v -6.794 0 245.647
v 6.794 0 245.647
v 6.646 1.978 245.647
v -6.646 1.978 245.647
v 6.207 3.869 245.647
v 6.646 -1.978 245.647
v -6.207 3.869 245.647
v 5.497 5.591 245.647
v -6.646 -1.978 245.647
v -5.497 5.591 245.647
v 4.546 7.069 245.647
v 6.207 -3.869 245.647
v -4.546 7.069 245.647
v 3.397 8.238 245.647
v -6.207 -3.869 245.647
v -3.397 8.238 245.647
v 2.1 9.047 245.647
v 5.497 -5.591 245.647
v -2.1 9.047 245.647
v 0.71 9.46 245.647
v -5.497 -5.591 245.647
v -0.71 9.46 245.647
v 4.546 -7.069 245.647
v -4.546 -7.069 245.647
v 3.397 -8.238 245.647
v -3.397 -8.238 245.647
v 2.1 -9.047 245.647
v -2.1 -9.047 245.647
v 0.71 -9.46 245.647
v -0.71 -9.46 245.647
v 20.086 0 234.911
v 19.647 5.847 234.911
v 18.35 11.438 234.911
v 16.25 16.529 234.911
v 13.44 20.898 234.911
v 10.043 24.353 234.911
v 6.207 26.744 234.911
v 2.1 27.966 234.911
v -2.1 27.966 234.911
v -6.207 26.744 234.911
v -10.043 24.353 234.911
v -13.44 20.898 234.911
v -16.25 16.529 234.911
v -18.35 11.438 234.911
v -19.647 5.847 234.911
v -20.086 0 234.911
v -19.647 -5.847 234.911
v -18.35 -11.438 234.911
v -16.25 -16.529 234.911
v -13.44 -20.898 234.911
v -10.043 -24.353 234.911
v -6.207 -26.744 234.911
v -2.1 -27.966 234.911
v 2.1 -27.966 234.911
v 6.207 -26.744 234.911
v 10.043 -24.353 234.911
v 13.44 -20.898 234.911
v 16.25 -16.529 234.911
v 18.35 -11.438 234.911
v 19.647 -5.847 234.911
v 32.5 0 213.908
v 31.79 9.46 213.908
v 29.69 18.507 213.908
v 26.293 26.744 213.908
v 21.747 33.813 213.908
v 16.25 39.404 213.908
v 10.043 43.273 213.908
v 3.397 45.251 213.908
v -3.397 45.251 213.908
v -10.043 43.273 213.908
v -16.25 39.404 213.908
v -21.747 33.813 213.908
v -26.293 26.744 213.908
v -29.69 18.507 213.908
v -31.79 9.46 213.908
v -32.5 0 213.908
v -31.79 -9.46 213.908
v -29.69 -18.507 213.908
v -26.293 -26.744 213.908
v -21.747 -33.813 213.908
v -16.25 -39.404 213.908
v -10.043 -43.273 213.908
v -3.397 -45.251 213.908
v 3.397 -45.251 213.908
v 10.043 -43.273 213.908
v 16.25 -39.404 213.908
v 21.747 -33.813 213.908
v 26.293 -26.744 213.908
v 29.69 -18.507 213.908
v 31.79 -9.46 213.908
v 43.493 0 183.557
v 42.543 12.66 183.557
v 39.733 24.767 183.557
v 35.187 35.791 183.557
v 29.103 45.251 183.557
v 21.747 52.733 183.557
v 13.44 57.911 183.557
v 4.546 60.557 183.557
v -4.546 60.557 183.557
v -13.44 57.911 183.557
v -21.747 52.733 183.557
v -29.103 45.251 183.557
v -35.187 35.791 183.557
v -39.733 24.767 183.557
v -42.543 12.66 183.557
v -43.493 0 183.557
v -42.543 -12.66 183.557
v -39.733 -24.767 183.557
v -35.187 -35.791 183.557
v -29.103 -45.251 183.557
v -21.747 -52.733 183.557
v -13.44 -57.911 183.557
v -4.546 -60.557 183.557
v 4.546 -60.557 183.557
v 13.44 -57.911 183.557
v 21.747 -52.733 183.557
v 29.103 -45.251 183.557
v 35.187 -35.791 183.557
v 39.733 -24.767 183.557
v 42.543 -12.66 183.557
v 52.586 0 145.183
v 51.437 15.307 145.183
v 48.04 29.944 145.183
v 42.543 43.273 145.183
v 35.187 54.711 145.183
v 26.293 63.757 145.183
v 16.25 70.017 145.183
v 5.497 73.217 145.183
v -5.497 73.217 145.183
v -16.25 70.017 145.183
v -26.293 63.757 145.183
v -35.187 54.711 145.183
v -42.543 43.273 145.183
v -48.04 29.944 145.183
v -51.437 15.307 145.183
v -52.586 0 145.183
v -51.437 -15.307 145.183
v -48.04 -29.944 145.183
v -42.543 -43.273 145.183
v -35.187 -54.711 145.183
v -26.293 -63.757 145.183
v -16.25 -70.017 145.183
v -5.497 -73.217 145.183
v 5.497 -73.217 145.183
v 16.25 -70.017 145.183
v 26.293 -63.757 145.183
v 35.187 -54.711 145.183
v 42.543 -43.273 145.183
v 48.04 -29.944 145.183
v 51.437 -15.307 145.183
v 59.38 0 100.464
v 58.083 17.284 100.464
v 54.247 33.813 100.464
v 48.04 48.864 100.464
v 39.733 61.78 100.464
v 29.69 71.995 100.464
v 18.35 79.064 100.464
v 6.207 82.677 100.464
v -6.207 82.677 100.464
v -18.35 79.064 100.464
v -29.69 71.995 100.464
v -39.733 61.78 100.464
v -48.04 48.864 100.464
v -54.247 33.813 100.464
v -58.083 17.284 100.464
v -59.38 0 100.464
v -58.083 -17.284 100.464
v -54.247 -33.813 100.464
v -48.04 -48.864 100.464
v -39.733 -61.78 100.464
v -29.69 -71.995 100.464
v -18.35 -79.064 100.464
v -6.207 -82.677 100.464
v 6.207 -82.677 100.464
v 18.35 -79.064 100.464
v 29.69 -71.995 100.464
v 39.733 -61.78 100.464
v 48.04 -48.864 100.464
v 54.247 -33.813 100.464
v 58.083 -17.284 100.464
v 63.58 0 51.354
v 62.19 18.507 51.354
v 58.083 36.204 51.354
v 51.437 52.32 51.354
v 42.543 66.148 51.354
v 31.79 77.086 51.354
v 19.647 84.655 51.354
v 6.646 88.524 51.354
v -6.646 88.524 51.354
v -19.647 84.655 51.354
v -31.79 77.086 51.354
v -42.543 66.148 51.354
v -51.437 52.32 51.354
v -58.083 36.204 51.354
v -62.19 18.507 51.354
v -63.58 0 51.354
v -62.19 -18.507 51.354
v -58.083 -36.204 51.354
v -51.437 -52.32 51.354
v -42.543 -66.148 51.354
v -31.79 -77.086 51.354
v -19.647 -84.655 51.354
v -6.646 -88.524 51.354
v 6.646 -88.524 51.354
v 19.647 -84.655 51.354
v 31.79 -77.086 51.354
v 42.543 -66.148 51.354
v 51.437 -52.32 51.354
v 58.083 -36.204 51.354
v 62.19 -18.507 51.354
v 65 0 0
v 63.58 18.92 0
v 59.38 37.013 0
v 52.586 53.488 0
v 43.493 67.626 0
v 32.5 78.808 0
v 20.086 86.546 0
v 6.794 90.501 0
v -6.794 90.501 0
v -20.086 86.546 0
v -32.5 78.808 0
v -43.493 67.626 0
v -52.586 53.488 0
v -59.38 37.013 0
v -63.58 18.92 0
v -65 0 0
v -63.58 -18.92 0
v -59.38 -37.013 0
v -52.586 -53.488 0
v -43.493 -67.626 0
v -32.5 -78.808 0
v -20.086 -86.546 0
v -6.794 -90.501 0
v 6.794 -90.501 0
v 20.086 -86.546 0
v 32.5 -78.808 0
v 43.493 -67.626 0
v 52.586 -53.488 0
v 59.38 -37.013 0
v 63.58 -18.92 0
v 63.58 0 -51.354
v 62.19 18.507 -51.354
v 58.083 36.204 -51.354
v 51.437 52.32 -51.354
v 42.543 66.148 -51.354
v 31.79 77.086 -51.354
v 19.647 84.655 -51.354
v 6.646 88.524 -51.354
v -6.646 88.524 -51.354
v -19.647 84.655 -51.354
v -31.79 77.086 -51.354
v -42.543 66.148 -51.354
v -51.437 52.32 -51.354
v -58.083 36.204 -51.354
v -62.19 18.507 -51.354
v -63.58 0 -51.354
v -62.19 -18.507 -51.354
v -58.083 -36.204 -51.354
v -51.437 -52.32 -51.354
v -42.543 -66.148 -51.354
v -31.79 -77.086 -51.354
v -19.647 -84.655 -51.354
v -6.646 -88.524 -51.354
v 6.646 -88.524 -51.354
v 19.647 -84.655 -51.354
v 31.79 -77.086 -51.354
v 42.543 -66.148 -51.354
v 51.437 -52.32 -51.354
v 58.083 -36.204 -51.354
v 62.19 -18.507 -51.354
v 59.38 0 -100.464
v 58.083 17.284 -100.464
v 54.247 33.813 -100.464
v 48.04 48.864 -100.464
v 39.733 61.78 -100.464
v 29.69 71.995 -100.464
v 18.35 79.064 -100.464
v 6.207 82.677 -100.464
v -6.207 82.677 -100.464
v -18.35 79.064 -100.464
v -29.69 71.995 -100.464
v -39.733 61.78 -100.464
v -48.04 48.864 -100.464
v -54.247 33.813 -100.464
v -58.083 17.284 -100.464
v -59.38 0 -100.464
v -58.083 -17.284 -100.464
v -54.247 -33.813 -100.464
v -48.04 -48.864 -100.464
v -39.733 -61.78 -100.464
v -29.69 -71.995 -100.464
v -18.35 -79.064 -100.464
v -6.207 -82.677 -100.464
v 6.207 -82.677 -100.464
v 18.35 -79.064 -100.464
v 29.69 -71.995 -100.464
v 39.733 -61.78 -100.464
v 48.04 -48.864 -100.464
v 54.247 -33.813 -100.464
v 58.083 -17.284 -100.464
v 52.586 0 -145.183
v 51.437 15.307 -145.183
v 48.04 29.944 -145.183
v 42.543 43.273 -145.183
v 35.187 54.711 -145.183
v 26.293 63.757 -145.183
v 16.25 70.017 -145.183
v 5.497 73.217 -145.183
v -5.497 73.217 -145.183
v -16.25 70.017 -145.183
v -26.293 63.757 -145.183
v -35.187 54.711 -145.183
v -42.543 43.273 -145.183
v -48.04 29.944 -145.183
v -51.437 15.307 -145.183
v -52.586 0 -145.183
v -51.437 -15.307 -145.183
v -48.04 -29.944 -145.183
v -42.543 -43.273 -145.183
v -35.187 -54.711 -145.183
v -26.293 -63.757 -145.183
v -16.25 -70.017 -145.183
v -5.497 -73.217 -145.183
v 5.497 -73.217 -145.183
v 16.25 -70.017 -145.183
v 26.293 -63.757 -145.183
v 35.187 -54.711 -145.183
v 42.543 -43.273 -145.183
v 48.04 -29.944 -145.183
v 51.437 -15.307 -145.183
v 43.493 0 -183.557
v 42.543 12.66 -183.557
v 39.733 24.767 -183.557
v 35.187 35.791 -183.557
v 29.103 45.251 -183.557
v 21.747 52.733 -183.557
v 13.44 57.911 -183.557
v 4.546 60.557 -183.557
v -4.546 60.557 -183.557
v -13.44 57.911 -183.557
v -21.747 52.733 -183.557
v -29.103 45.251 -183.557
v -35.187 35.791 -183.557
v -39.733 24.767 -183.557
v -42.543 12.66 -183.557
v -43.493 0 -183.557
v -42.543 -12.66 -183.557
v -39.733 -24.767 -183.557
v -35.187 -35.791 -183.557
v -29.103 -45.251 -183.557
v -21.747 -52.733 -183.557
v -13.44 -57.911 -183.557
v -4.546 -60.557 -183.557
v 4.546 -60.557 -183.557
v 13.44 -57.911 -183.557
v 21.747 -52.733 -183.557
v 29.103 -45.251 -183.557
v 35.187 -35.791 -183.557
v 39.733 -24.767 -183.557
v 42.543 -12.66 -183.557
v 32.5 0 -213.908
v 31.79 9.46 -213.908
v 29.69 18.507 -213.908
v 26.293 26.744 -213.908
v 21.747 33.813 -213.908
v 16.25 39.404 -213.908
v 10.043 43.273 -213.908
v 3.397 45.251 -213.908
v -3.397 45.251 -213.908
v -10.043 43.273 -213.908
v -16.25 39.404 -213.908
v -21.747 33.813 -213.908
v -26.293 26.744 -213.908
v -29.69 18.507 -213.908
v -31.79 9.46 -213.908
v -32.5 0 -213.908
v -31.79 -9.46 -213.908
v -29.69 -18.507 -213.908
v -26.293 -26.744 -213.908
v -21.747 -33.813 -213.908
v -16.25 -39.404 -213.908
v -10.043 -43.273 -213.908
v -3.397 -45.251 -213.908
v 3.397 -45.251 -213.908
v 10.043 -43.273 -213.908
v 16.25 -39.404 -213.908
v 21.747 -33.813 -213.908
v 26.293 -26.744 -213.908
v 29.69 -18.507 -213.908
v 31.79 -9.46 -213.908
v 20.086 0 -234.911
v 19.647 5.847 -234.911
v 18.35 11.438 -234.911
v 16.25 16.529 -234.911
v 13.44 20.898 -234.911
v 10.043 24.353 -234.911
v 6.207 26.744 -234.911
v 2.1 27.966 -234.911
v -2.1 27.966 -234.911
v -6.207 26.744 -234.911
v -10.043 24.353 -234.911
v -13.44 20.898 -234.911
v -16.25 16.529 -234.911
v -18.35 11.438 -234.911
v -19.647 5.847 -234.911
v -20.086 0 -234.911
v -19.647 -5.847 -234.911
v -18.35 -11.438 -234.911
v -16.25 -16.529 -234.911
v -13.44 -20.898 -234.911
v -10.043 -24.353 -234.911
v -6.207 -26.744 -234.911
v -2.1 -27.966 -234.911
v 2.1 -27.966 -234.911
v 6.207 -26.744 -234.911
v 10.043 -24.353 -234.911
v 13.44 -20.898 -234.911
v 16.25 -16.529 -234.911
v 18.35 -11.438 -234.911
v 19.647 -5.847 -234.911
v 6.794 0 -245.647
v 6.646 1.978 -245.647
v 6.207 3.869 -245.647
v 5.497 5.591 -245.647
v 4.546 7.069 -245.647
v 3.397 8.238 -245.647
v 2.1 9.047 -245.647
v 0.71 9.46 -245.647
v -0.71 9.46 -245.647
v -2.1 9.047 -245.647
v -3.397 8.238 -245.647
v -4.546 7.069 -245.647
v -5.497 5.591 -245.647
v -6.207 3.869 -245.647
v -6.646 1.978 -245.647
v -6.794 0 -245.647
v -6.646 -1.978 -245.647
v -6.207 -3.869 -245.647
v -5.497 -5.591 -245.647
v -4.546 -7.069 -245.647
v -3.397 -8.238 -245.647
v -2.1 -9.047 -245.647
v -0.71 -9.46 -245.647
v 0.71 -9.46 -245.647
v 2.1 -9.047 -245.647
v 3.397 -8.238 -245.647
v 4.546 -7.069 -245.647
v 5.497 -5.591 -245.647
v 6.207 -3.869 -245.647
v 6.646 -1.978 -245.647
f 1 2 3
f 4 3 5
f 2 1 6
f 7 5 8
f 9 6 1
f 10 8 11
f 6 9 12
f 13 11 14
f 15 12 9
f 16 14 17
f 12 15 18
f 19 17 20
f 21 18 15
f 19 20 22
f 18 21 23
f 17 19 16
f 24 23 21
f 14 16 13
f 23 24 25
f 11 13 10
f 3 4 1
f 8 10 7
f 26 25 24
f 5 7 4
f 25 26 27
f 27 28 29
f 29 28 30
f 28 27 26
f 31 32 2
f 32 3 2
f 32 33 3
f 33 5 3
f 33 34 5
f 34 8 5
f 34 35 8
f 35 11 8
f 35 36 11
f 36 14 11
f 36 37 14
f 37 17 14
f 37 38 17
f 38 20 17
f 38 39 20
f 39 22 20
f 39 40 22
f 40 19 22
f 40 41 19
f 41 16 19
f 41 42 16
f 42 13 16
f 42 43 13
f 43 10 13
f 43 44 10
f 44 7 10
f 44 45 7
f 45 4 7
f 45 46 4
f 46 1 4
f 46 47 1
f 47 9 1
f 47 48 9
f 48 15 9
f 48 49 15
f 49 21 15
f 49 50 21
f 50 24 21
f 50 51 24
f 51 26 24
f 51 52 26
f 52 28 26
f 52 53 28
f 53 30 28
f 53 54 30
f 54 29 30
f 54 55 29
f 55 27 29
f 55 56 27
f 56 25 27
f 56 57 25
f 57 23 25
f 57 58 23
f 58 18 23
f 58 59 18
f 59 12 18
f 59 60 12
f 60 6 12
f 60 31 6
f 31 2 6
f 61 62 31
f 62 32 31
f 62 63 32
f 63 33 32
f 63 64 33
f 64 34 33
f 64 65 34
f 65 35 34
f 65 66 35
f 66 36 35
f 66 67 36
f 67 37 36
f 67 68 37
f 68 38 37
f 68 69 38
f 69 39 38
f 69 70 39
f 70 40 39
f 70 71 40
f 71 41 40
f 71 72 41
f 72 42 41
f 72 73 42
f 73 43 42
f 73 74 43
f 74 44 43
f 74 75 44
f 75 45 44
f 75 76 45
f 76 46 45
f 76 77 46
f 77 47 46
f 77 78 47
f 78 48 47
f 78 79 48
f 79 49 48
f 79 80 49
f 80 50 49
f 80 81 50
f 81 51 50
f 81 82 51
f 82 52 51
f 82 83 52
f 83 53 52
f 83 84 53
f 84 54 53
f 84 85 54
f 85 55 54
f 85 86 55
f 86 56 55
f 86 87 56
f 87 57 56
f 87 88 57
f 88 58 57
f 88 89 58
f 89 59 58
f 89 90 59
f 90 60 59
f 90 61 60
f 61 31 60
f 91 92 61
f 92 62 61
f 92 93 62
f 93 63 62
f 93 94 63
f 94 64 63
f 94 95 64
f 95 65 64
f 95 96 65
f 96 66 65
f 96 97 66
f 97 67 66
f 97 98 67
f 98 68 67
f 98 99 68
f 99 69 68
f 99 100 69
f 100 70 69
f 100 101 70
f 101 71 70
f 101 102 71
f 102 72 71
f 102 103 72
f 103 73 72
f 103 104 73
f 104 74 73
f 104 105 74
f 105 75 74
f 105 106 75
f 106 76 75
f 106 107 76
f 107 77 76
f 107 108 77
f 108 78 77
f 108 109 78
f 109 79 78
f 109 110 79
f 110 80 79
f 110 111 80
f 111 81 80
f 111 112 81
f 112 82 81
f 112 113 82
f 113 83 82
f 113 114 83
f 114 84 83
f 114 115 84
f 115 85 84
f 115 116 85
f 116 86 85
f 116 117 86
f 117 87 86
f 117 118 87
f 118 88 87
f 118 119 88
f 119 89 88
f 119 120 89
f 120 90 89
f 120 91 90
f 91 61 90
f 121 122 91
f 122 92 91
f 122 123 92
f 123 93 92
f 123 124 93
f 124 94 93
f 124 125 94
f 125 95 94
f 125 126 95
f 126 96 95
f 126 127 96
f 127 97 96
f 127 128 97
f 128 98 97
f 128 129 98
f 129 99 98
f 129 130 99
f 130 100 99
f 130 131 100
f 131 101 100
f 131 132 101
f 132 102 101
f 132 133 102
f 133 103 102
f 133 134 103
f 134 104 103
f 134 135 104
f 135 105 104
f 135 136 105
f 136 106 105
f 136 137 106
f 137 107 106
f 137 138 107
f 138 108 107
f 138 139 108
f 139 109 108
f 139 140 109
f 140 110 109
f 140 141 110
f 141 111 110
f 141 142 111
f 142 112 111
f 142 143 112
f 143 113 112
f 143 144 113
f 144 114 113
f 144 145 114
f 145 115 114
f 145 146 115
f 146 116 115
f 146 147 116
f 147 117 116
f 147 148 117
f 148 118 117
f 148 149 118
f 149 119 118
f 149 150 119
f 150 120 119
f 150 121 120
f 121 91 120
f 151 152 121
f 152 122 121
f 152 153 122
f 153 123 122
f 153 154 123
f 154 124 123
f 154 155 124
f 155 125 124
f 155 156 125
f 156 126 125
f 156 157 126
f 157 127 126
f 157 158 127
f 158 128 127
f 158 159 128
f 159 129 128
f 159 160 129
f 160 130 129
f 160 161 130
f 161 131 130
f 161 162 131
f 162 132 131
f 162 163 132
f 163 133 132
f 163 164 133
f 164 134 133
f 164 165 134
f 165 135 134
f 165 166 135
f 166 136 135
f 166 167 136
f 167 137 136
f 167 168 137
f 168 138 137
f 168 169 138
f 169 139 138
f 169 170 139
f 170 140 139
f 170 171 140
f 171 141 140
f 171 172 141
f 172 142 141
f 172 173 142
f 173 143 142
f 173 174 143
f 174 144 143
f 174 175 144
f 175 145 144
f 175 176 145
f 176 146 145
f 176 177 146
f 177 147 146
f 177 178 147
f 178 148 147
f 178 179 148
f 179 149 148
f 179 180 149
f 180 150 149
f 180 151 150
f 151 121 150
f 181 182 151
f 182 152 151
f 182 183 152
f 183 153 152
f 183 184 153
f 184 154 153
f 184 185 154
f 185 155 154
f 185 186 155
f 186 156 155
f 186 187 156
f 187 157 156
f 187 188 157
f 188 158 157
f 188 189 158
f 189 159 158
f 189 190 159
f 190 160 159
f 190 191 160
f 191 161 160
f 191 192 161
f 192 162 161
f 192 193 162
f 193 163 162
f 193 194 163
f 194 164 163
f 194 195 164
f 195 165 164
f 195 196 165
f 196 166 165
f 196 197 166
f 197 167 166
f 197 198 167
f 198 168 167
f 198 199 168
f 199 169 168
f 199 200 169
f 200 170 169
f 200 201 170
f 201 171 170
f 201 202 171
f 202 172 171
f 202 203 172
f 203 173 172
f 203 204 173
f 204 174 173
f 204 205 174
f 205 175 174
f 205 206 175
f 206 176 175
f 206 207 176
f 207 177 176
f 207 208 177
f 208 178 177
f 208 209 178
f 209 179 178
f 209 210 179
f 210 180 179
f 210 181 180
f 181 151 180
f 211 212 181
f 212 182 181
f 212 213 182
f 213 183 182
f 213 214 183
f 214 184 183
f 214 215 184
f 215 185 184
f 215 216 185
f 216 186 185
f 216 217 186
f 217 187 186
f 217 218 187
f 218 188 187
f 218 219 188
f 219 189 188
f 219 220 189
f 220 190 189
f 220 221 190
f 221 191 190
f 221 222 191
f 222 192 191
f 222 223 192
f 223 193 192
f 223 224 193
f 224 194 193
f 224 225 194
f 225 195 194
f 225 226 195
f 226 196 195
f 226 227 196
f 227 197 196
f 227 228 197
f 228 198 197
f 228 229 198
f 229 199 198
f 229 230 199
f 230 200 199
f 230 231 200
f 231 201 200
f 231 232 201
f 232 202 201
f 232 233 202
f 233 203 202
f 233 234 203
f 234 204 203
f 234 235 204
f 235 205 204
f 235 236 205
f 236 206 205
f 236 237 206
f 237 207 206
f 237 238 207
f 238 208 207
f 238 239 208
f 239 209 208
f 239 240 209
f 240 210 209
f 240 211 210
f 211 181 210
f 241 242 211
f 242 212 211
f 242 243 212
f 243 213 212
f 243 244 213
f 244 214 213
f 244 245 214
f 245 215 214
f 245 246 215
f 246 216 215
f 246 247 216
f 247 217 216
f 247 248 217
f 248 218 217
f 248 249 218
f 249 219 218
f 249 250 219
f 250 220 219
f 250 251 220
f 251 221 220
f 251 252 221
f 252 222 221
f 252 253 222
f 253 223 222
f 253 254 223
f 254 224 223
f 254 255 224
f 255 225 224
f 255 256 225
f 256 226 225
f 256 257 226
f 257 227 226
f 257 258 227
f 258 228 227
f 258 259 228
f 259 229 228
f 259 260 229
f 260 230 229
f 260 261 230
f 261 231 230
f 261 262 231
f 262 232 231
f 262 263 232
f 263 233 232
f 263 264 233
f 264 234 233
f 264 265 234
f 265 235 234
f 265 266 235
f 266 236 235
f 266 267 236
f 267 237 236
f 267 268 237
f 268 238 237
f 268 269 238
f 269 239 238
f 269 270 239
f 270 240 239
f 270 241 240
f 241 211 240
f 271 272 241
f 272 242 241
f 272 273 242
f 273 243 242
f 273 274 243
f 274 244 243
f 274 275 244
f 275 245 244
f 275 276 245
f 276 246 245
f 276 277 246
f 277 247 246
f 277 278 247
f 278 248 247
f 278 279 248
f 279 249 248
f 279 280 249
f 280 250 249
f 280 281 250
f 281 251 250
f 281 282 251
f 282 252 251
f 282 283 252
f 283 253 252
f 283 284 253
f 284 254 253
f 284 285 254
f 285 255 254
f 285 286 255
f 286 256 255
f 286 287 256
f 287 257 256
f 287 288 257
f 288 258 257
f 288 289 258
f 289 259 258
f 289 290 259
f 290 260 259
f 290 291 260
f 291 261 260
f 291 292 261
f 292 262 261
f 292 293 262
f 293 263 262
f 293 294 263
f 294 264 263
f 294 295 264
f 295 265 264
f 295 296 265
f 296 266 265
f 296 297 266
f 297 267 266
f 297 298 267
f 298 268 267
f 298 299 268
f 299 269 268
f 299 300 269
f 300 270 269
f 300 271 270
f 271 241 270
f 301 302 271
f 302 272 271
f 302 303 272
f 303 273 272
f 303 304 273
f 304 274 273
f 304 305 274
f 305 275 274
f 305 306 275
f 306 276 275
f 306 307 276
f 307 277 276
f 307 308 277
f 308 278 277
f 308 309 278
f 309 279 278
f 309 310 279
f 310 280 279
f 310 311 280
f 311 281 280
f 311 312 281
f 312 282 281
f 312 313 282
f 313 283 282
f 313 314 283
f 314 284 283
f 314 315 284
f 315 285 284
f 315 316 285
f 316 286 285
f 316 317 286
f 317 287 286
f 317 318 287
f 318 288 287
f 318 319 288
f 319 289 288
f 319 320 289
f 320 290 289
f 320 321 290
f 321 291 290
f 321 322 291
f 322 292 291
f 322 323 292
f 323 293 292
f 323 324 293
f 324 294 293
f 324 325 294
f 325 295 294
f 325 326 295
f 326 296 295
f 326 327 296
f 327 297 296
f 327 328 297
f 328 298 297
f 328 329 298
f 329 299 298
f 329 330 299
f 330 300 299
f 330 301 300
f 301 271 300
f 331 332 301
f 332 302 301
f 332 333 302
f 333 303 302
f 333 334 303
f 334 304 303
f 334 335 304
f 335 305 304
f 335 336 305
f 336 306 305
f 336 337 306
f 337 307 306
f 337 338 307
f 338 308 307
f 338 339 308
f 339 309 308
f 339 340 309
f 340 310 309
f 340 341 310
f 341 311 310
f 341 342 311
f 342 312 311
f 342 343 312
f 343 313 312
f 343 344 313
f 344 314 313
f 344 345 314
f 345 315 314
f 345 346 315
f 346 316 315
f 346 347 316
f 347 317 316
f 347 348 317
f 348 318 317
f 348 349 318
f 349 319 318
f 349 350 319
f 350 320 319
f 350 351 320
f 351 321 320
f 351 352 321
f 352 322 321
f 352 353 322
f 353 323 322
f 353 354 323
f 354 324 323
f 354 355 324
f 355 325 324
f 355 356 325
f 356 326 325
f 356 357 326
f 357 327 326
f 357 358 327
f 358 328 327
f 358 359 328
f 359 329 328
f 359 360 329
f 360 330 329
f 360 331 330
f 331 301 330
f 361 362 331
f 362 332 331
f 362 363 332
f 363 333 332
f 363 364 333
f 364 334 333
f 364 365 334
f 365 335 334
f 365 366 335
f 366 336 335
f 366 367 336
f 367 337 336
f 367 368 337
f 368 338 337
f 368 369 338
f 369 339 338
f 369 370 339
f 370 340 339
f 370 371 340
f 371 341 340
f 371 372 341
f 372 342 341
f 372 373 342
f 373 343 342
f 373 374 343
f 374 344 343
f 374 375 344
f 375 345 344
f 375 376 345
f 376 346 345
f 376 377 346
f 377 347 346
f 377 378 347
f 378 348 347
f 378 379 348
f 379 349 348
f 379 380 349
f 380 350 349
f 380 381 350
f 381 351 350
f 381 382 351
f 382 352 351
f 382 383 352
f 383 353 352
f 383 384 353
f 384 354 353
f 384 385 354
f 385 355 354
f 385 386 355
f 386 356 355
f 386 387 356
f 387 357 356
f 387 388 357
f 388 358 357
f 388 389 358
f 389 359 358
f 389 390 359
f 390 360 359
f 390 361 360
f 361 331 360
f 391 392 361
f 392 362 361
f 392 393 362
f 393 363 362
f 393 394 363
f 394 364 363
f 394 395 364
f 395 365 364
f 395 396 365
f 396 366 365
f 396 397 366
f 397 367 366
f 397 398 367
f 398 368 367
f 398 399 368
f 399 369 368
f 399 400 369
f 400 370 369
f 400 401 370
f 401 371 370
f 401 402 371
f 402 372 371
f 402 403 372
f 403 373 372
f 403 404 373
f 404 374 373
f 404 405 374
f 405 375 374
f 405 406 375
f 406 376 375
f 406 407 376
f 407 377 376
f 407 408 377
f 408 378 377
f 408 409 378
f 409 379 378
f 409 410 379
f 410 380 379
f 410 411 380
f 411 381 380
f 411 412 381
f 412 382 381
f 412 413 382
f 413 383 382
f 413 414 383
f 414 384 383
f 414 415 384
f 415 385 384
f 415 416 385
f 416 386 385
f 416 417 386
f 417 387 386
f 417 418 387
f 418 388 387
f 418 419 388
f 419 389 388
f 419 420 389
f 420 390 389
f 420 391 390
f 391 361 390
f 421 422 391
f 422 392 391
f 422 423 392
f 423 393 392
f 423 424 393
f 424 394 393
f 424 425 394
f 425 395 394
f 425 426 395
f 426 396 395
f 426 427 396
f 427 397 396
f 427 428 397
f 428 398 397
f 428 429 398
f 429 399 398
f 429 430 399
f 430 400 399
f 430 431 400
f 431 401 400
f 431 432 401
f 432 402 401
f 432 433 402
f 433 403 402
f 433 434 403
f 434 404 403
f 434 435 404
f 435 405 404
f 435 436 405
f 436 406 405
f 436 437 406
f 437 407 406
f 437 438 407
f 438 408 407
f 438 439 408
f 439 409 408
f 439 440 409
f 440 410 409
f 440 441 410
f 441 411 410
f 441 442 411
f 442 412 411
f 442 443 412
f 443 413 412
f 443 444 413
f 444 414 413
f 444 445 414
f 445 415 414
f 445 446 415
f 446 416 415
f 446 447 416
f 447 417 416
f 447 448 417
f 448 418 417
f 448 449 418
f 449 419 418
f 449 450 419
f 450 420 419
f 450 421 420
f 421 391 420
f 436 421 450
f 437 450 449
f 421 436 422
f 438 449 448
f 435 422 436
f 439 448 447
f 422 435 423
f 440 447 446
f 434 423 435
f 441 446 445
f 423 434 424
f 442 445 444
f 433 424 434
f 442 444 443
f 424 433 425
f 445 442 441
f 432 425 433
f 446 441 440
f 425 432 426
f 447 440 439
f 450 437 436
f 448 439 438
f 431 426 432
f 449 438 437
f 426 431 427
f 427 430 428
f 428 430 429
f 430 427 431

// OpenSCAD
// Generated by SolidPython 1.0.1 on 2020-07-29 00:46:46


scale(v = [5, 7, 19]) {
	sphere(r = 13);
}
/***********************************************
*********      SolidPython code:      **********
************************************************
 
# import packages: SolidPython
from solid import *
from solid.utils import *
from itertools import chain, combinations, permutations


class Resize:

    def __init__(self, scad_file):
        self.scad_file = scad_file
        #self.scad_file = import_scad(scad_file)
        # cone/cylinder param:
        self.r1 = 0
        self.r2 = 0
        self.h = 0
        # rectangular prism param:
        self.w = 0
        self.l = 0
        # ellipse param:
        self.r = 0

    # import OpenScad code (file name corresponds to shape)


    # classify shape + parameters
    def assign(self, param1, param2, param3):
        if self.scad_file == 'cone.scad':
            self.r1 = param1
            self.r2 = param2
            self.h = param3
        elif self.scad_file == 'cylinder.scad':
            self.r1 = param1
            self.r2 = param2
            self.h = param3
        elif self.scad_file == 'rectangularPrism.scad':
            self.h = param1
            self.l = param2
            self.w = param3
        else:
            self.r = param1
            self.h = param2

    # resize parameters
    def iterate(self):
        x = range(3, 20, 2)
        i = 1
        if self.scad_file == 'cone.scad':
            tempList = list(permutations(x, 2))
            for temp in tempList:
                param1 = temp[0]
                param2 = temp[1]
                filepath = 'produced_scad_files/' + 'cone' + str(param1) + '_' + str(param2) + '_' + '.scad'
                scad_render_to_file(cylinder(h=param1, r1=param2, r2=0), filepath)

        elif self.scad_file == 'cylinder.scad':
            tempList = list(permutations(x, 3))
            for temp in tempList:
                param1 = temp[0]
                param2 = temp[1]
                filepath = 'produced_scad_files/' + 'cylinder' + str(param1) + '_' + str(param2) + '_' + '.scad'
                scad_render_to_file(cylinder(h=param1, r1=param2, r2=param2), filepath)

        elif self.scad_file == 'rectangularPrism.scad':
            tempList = list(permutations(x, 3))
            for temp in tempList:
                param1 = temp[0]
                param2 = temp[1]
                param3 = temp[2]
                filepath = 'produced_scad_files/' + 'rectangularPrism' + str(param1) + '_' + str(param2) + '_' + str(
                    param3) + '.scad'
                scad_render_to_file(cube(size=(param1, param2, param3)), filepath)

        elif self.scad_file == 'ellipse.scad':
            tempList = list(permutations(x, 4))
            for temp in tempList:
                param1 = temp[0]
                param2 = temp[1]
                param3 = temp[2]
                param4 = temp[3]
                filepath = 'produced_scad_files/' + 'ellipse' + str(param1) + '_' + str(param2) + '_' + str(param3) + '_' + str(param4) + '.scad'
                scad_render_to_file(scale([param1, param2, param3])(sphere(r=param4)), filepath)

    def render_to_scadfile(self):
        scad_render_to_file(scad, 'example.scad') 
 
************************************************/
